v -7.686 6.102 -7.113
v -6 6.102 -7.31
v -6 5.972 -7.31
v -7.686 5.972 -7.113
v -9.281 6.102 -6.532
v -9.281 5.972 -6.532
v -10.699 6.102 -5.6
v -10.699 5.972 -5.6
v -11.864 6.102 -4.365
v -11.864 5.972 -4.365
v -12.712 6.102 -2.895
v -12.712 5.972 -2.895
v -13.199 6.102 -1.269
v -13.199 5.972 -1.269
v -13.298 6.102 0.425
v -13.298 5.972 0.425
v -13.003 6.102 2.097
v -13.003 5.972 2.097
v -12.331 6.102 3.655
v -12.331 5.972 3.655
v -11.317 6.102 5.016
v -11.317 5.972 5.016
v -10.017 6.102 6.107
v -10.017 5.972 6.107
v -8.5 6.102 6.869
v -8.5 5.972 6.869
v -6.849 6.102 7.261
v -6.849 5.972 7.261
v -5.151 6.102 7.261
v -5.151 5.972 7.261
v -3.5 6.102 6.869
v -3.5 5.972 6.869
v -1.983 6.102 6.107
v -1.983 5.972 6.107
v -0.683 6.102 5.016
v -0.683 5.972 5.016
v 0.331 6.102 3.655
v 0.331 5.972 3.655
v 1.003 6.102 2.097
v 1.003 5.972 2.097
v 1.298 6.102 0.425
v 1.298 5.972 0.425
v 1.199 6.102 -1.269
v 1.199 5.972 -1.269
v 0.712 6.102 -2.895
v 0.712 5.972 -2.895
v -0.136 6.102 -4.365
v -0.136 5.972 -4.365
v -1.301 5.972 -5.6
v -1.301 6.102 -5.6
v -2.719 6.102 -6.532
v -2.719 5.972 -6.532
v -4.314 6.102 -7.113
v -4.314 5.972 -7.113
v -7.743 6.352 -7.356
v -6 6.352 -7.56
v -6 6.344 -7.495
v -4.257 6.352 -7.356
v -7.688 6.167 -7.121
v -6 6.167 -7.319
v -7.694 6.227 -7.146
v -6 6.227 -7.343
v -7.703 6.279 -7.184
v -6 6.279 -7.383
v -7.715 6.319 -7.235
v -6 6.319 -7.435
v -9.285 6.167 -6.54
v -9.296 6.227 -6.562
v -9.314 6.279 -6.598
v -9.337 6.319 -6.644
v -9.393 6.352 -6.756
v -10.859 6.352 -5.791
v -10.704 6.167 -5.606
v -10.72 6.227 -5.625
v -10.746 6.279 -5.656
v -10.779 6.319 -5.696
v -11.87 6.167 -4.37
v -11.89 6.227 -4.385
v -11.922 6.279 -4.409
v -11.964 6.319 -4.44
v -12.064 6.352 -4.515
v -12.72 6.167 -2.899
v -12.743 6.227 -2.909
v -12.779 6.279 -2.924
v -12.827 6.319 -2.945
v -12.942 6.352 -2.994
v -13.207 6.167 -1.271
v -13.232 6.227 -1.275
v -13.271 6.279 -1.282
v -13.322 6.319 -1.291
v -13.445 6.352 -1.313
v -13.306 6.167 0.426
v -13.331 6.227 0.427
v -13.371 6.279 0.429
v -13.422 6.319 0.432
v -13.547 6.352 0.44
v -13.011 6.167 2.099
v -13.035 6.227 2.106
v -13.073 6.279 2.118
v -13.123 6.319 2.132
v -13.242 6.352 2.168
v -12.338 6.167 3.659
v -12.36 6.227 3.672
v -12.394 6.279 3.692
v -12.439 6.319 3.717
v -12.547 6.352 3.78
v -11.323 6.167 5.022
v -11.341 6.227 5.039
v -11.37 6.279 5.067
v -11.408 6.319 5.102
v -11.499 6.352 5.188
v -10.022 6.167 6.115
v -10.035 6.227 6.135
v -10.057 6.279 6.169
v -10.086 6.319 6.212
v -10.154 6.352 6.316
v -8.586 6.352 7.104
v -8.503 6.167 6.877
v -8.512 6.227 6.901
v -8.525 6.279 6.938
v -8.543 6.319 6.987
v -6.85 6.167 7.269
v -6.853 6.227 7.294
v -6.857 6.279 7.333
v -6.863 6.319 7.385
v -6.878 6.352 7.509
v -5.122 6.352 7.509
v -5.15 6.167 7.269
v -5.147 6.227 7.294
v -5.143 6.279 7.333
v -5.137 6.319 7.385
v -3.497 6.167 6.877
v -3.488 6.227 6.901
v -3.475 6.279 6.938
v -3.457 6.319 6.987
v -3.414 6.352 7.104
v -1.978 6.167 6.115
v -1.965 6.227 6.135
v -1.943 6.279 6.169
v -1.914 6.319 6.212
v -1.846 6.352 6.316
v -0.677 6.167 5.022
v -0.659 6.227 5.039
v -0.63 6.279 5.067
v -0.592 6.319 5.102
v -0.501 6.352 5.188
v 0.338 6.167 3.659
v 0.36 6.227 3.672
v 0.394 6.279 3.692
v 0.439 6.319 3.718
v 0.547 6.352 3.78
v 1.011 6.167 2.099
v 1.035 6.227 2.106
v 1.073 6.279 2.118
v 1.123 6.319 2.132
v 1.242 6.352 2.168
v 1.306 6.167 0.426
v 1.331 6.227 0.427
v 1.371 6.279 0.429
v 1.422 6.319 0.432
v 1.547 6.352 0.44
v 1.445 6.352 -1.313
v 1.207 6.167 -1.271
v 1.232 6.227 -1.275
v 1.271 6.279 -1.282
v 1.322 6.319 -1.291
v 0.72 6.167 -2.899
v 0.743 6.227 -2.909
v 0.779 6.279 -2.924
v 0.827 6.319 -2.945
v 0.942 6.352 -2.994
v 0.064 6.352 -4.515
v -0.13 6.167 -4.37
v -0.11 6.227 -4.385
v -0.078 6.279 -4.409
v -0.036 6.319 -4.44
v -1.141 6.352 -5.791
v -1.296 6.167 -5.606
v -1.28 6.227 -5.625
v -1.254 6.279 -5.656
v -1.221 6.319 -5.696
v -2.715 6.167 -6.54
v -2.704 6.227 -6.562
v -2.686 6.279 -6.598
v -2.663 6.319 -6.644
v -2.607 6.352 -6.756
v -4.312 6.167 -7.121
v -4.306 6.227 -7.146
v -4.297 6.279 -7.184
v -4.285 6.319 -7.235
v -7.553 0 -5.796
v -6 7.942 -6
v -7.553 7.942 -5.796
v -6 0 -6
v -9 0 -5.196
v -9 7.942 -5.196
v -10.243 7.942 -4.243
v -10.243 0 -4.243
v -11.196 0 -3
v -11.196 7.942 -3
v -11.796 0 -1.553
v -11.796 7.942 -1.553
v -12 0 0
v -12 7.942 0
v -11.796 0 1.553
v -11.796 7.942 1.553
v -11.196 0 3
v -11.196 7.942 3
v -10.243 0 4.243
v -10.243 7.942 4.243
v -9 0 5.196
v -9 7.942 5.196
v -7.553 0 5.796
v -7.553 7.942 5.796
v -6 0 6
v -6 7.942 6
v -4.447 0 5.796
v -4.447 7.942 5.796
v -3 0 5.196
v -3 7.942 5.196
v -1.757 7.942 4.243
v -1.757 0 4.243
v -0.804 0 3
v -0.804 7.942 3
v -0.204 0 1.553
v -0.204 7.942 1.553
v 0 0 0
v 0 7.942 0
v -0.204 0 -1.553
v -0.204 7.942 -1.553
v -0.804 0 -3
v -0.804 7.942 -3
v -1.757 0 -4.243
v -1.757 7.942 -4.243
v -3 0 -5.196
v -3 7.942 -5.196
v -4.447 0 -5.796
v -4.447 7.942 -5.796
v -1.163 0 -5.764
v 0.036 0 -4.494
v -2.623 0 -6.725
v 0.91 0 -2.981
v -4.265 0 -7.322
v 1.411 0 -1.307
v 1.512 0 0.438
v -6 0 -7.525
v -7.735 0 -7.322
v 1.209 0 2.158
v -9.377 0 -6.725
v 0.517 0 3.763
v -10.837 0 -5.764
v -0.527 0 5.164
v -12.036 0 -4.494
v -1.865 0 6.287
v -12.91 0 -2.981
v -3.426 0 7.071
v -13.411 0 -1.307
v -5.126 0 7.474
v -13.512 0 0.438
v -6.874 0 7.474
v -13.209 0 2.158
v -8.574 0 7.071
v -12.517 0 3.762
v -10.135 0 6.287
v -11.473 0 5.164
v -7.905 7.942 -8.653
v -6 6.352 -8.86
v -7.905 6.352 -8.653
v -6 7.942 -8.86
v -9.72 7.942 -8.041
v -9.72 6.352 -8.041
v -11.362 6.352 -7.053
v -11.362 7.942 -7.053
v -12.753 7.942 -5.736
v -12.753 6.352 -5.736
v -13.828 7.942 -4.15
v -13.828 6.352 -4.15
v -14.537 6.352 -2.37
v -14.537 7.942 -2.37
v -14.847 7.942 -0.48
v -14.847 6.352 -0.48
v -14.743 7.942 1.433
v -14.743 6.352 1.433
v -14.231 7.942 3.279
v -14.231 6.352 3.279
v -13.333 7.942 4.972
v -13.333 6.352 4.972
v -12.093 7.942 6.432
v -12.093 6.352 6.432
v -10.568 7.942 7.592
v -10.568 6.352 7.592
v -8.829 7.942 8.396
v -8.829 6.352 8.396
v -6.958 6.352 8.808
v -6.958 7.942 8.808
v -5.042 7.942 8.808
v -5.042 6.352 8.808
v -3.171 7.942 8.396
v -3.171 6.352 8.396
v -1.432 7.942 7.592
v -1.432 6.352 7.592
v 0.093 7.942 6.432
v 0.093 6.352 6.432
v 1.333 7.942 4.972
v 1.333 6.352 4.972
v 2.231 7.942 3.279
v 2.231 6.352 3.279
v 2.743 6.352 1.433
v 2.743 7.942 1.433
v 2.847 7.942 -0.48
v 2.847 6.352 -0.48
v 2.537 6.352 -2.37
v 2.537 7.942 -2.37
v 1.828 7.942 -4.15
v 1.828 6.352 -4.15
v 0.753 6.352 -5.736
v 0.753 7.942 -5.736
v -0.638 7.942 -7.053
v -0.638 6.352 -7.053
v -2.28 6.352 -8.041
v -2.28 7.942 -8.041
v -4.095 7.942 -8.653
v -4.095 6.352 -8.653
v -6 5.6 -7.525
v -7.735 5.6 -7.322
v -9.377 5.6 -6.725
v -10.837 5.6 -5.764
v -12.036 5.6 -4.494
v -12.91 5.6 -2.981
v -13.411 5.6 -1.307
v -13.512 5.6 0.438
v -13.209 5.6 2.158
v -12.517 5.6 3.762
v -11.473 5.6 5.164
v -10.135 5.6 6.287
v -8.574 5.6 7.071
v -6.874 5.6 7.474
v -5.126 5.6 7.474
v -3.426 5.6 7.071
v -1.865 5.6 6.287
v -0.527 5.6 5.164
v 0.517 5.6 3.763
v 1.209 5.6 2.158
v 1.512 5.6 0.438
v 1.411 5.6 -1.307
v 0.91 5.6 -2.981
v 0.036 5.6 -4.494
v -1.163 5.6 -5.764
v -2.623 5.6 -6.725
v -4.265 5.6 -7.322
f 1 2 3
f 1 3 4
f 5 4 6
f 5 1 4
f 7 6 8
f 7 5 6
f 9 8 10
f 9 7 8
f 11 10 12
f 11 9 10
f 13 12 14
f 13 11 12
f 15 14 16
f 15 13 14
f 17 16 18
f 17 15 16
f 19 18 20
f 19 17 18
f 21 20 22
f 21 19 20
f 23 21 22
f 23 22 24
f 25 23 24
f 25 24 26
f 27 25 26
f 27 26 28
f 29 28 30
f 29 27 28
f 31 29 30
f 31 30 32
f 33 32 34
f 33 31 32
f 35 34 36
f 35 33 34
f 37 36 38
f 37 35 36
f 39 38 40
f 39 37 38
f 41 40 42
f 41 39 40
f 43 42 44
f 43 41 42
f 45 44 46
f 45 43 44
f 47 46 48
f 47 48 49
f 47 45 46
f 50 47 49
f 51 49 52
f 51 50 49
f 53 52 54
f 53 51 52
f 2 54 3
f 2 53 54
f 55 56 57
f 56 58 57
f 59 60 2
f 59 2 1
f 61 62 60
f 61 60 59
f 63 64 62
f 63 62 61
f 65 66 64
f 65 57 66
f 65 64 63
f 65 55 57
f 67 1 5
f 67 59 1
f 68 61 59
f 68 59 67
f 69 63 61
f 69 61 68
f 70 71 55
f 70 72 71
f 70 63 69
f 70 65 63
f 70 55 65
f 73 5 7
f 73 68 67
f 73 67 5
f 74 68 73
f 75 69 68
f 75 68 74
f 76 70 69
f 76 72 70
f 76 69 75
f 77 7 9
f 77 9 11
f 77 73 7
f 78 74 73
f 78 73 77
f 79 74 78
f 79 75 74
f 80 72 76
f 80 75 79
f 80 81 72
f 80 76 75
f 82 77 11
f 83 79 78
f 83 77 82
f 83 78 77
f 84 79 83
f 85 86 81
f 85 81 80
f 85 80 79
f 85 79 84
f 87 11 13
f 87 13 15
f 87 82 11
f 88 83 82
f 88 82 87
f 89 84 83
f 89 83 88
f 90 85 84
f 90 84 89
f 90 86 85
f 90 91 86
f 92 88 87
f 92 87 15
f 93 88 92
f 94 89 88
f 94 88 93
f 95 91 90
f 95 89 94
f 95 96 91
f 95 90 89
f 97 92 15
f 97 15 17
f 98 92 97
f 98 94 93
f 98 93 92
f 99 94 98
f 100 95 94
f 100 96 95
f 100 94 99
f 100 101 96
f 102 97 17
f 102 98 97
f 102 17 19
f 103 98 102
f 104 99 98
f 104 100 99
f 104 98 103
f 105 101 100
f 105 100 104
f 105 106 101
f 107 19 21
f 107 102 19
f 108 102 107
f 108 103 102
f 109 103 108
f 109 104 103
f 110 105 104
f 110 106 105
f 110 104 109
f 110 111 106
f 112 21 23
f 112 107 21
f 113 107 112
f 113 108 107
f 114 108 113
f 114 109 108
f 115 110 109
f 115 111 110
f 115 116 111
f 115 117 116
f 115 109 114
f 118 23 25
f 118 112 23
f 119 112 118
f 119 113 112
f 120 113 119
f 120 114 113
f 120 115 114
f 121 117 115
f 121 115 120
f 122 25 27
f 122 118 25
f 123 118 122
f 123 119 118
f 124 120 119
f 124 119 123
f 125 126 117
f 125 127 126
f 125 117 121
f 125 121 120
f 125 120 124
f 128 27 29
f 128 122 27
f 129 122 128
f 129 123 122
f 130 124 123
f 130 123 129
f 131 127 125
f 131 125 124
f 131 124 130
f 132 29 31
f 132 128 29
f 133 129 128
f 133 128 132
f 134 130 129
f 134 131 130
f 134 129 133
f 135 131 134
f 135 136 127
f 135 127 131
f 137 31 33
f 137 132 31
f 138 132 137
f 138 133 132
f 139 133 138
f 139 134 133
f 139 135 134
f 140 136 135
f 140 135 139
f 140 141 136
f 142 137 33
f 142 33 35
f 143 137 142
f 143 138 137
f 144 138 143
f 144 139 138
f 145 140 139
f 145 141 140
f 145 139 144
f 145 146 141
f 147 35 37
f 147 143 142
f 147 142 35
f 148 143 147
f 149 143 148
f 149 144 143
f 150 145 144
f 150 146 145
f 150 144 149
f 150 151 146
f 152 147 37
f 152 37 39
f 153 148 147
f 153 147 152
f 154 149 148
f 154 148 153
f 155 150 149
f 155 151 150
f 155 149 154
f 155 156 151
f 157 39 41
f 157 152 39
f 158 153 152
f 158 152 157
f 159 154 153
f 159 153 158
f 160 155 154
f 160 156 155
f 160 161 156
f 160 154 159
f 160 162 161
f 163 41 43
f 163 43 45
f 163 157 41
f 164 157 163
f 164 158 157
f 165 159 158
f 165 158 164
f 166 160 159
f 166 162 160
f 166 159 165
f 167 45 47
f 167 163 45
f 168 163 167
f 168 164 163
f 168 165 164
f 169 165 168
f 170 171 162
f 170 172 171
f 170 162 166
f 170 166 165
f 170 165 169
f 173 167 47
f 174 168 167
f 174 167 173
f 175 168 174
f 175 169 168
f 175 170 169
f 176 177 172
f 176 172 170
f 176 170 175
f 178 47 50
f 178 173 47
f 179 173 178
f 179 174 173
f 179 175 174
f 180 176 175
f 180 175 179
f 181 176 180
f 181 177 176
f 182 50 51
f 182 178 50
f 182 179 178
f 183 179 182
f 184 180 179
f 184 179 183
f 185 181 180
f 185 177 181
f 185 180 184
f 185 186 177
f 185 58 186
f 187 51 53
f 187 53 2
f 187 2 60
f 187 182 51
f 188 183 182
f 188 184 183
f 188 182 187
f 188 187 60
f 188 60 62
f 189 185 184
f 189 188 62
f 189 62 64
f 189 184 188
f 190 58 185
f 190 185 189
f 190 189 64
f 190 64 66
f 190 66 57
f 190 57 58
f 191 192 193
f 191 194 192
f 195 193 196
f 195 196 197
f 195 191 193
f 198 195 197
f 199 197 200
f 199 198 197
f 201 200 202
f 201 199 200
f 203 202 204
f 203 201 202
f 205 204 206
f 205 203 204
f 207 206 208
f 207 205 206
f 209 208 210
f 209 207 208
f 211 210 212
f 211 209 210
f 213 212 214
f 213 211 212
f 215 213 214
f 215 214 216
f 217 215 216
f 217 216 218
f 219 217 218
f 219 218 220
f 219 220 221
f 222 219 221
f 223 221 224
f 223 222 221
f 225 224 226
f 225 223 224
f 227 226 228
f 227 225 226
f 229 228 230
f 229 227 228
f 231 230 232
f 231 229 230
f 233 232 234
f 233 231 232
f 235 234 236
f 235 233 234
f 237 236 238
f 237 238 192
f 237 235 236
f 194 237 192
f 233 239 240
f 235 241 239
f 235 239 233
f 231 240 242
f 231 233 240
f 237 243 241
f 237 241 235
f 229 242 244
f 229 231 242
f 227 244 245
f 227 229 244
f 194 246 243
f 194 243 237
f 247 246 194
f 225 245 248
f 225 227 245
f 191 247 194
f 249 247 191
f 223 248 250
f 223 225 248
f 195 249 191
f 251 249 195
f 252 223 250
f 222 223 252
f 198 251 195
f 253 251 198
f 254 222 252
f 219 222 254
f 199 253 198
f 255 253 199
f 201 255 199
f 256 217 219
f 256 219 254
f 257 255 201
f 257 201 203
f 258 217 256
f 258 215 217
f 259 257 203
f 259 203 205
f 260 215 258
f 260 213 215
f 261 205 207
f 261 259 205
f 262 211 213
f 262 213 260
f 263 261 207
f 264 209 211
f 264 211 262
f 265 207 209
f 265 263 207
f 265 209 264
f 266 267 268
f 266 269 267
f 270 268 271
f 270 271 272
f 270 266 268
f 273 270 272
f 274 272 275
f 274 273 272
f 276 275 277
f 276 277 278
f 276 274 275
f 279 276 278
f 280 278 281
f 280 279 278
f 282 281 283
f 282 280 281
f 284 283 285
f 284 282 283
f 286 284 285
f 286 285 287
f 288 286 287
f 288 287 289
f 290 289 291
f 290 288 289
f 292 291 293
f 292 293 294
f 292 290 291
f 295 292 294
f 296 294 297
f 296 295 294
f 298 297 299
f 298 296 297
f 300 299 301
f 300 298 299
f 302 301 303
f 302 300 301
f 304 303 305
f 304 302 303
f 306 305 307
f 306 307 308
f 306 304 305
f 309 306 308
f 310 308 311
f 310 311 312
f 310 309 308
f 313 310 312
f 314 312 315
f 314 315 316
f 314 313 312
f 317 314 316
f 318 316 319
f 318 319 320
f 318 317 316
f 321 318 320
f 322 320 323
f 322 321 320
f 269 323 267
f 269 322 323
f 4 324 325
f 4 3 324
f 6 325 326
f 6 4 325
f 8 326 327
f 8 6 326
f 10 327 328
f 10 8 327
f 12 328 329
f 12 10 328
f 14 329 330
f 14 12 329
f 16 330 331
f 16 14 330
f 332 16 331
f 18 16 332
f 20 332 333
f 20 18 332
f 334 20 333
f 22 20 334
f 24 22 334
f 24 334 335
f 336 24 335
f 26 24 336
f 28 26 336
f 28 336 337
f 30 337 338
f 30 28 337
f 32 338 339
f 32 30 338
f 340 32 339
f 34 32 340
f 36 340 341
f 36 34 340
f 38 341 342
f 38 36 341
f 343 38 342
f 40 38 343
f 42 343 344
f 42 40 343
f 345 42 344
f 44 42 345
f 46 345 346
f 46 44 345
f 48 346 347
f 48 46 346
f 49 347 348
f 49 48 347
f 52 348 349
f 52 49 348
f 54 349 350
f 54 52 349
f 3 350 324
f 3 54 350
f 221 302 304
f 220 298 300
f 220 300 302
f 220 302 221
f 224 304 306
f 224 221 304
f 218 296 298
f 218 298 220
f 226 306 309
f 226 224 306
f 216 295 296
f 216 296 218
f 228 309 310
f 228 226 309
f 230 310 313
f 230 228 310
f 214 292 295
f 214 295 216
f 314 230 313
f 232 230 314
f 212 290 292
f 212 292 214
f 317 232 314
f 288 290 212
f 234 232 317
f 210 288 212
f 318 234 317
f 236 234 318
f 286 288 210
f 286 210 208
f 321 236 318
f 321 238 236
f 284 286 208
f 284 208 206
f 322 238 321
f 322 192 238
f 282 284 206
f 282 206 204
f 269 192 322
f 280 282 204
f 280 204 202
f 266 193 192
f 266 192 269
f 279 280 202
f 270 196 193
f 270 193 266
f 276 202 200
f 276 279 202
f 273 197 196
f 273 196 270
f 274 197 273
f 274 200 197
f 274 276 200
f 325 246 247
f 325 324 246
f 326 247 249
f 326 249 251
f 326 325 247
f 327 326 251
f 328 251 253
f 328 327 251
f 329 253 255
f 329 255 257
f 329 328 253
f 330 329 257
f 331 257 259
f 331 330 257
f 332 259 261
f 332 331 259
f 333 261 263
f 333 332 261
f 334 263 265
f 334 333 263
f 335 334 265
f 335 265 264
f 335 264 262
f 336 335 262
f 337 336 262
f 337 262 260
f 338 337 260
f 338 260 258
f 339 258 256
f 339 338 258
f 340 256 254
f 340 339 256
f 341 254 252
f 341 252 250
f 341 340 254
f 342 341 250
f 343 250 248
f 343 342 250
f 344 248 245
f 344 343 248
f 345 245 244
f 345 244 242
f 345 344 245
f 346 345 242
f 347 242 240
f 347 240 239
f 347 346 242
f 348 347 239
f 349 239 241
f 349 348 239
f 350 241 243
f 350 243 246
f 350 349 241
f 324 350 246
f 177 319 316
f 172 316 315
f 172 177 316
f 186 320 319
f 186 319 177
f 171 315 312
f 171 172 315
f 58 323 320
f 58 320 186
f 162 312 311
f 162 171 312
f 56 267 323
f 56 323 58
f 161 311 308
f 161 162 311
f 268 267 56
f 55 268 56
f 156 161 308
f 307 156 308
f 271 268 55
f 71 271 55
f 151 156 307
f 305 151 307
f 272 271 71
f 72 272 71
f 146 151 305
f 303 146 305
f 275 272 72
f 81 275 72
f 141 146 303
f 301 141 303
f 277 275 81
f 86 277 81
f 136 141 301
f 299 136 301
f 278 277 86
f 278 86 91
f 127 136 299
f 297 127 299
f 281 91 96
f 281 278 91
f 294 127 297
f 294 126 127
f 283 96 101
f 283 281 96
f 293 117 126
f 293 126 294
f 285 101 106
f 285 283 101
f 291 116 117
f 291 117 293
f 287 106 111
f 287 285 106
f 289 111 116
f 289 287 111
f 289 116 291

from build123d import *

# Parameters (mm, degrees)
SKETCH1_W = 1.525
SKETCH1_H = 5.6
FILLET1_R = 0.25


with BuildPart() as part:
    # Sketch1 → Revolve1 (revolve)
    with BuildSketch(Plane.XY, mode=Mode.PRIVATE) as revolve1_sk:
        with Locations((0.7625, 2.8)):
            Rectangle(SKETCH1_W, SKETCH1_H)
        Polygon((0, 5.6), (1.525, 5.6), (1.31, 5.972390924), (1.31, 6.352390924), (2.86, 6.352390924), (2.86, 7.942390924), (0, 7.942390924), align=None)
    revolve(revolve1_sk.sketch.rotate(Axis((-6, 0, 0), (0, 1, 0)), 90), axis=Axis((-6, 0, 0), (0, 1, 0)))

    # Fillet1
    fillet1_edges = [part.edges().sort_by_distance(p)[0] for p in [
        (-6, 6.352390924, 7.31),
    ]]
    fillet(fillet1_edges, radius=FILLET1_R)


solid = part.part
